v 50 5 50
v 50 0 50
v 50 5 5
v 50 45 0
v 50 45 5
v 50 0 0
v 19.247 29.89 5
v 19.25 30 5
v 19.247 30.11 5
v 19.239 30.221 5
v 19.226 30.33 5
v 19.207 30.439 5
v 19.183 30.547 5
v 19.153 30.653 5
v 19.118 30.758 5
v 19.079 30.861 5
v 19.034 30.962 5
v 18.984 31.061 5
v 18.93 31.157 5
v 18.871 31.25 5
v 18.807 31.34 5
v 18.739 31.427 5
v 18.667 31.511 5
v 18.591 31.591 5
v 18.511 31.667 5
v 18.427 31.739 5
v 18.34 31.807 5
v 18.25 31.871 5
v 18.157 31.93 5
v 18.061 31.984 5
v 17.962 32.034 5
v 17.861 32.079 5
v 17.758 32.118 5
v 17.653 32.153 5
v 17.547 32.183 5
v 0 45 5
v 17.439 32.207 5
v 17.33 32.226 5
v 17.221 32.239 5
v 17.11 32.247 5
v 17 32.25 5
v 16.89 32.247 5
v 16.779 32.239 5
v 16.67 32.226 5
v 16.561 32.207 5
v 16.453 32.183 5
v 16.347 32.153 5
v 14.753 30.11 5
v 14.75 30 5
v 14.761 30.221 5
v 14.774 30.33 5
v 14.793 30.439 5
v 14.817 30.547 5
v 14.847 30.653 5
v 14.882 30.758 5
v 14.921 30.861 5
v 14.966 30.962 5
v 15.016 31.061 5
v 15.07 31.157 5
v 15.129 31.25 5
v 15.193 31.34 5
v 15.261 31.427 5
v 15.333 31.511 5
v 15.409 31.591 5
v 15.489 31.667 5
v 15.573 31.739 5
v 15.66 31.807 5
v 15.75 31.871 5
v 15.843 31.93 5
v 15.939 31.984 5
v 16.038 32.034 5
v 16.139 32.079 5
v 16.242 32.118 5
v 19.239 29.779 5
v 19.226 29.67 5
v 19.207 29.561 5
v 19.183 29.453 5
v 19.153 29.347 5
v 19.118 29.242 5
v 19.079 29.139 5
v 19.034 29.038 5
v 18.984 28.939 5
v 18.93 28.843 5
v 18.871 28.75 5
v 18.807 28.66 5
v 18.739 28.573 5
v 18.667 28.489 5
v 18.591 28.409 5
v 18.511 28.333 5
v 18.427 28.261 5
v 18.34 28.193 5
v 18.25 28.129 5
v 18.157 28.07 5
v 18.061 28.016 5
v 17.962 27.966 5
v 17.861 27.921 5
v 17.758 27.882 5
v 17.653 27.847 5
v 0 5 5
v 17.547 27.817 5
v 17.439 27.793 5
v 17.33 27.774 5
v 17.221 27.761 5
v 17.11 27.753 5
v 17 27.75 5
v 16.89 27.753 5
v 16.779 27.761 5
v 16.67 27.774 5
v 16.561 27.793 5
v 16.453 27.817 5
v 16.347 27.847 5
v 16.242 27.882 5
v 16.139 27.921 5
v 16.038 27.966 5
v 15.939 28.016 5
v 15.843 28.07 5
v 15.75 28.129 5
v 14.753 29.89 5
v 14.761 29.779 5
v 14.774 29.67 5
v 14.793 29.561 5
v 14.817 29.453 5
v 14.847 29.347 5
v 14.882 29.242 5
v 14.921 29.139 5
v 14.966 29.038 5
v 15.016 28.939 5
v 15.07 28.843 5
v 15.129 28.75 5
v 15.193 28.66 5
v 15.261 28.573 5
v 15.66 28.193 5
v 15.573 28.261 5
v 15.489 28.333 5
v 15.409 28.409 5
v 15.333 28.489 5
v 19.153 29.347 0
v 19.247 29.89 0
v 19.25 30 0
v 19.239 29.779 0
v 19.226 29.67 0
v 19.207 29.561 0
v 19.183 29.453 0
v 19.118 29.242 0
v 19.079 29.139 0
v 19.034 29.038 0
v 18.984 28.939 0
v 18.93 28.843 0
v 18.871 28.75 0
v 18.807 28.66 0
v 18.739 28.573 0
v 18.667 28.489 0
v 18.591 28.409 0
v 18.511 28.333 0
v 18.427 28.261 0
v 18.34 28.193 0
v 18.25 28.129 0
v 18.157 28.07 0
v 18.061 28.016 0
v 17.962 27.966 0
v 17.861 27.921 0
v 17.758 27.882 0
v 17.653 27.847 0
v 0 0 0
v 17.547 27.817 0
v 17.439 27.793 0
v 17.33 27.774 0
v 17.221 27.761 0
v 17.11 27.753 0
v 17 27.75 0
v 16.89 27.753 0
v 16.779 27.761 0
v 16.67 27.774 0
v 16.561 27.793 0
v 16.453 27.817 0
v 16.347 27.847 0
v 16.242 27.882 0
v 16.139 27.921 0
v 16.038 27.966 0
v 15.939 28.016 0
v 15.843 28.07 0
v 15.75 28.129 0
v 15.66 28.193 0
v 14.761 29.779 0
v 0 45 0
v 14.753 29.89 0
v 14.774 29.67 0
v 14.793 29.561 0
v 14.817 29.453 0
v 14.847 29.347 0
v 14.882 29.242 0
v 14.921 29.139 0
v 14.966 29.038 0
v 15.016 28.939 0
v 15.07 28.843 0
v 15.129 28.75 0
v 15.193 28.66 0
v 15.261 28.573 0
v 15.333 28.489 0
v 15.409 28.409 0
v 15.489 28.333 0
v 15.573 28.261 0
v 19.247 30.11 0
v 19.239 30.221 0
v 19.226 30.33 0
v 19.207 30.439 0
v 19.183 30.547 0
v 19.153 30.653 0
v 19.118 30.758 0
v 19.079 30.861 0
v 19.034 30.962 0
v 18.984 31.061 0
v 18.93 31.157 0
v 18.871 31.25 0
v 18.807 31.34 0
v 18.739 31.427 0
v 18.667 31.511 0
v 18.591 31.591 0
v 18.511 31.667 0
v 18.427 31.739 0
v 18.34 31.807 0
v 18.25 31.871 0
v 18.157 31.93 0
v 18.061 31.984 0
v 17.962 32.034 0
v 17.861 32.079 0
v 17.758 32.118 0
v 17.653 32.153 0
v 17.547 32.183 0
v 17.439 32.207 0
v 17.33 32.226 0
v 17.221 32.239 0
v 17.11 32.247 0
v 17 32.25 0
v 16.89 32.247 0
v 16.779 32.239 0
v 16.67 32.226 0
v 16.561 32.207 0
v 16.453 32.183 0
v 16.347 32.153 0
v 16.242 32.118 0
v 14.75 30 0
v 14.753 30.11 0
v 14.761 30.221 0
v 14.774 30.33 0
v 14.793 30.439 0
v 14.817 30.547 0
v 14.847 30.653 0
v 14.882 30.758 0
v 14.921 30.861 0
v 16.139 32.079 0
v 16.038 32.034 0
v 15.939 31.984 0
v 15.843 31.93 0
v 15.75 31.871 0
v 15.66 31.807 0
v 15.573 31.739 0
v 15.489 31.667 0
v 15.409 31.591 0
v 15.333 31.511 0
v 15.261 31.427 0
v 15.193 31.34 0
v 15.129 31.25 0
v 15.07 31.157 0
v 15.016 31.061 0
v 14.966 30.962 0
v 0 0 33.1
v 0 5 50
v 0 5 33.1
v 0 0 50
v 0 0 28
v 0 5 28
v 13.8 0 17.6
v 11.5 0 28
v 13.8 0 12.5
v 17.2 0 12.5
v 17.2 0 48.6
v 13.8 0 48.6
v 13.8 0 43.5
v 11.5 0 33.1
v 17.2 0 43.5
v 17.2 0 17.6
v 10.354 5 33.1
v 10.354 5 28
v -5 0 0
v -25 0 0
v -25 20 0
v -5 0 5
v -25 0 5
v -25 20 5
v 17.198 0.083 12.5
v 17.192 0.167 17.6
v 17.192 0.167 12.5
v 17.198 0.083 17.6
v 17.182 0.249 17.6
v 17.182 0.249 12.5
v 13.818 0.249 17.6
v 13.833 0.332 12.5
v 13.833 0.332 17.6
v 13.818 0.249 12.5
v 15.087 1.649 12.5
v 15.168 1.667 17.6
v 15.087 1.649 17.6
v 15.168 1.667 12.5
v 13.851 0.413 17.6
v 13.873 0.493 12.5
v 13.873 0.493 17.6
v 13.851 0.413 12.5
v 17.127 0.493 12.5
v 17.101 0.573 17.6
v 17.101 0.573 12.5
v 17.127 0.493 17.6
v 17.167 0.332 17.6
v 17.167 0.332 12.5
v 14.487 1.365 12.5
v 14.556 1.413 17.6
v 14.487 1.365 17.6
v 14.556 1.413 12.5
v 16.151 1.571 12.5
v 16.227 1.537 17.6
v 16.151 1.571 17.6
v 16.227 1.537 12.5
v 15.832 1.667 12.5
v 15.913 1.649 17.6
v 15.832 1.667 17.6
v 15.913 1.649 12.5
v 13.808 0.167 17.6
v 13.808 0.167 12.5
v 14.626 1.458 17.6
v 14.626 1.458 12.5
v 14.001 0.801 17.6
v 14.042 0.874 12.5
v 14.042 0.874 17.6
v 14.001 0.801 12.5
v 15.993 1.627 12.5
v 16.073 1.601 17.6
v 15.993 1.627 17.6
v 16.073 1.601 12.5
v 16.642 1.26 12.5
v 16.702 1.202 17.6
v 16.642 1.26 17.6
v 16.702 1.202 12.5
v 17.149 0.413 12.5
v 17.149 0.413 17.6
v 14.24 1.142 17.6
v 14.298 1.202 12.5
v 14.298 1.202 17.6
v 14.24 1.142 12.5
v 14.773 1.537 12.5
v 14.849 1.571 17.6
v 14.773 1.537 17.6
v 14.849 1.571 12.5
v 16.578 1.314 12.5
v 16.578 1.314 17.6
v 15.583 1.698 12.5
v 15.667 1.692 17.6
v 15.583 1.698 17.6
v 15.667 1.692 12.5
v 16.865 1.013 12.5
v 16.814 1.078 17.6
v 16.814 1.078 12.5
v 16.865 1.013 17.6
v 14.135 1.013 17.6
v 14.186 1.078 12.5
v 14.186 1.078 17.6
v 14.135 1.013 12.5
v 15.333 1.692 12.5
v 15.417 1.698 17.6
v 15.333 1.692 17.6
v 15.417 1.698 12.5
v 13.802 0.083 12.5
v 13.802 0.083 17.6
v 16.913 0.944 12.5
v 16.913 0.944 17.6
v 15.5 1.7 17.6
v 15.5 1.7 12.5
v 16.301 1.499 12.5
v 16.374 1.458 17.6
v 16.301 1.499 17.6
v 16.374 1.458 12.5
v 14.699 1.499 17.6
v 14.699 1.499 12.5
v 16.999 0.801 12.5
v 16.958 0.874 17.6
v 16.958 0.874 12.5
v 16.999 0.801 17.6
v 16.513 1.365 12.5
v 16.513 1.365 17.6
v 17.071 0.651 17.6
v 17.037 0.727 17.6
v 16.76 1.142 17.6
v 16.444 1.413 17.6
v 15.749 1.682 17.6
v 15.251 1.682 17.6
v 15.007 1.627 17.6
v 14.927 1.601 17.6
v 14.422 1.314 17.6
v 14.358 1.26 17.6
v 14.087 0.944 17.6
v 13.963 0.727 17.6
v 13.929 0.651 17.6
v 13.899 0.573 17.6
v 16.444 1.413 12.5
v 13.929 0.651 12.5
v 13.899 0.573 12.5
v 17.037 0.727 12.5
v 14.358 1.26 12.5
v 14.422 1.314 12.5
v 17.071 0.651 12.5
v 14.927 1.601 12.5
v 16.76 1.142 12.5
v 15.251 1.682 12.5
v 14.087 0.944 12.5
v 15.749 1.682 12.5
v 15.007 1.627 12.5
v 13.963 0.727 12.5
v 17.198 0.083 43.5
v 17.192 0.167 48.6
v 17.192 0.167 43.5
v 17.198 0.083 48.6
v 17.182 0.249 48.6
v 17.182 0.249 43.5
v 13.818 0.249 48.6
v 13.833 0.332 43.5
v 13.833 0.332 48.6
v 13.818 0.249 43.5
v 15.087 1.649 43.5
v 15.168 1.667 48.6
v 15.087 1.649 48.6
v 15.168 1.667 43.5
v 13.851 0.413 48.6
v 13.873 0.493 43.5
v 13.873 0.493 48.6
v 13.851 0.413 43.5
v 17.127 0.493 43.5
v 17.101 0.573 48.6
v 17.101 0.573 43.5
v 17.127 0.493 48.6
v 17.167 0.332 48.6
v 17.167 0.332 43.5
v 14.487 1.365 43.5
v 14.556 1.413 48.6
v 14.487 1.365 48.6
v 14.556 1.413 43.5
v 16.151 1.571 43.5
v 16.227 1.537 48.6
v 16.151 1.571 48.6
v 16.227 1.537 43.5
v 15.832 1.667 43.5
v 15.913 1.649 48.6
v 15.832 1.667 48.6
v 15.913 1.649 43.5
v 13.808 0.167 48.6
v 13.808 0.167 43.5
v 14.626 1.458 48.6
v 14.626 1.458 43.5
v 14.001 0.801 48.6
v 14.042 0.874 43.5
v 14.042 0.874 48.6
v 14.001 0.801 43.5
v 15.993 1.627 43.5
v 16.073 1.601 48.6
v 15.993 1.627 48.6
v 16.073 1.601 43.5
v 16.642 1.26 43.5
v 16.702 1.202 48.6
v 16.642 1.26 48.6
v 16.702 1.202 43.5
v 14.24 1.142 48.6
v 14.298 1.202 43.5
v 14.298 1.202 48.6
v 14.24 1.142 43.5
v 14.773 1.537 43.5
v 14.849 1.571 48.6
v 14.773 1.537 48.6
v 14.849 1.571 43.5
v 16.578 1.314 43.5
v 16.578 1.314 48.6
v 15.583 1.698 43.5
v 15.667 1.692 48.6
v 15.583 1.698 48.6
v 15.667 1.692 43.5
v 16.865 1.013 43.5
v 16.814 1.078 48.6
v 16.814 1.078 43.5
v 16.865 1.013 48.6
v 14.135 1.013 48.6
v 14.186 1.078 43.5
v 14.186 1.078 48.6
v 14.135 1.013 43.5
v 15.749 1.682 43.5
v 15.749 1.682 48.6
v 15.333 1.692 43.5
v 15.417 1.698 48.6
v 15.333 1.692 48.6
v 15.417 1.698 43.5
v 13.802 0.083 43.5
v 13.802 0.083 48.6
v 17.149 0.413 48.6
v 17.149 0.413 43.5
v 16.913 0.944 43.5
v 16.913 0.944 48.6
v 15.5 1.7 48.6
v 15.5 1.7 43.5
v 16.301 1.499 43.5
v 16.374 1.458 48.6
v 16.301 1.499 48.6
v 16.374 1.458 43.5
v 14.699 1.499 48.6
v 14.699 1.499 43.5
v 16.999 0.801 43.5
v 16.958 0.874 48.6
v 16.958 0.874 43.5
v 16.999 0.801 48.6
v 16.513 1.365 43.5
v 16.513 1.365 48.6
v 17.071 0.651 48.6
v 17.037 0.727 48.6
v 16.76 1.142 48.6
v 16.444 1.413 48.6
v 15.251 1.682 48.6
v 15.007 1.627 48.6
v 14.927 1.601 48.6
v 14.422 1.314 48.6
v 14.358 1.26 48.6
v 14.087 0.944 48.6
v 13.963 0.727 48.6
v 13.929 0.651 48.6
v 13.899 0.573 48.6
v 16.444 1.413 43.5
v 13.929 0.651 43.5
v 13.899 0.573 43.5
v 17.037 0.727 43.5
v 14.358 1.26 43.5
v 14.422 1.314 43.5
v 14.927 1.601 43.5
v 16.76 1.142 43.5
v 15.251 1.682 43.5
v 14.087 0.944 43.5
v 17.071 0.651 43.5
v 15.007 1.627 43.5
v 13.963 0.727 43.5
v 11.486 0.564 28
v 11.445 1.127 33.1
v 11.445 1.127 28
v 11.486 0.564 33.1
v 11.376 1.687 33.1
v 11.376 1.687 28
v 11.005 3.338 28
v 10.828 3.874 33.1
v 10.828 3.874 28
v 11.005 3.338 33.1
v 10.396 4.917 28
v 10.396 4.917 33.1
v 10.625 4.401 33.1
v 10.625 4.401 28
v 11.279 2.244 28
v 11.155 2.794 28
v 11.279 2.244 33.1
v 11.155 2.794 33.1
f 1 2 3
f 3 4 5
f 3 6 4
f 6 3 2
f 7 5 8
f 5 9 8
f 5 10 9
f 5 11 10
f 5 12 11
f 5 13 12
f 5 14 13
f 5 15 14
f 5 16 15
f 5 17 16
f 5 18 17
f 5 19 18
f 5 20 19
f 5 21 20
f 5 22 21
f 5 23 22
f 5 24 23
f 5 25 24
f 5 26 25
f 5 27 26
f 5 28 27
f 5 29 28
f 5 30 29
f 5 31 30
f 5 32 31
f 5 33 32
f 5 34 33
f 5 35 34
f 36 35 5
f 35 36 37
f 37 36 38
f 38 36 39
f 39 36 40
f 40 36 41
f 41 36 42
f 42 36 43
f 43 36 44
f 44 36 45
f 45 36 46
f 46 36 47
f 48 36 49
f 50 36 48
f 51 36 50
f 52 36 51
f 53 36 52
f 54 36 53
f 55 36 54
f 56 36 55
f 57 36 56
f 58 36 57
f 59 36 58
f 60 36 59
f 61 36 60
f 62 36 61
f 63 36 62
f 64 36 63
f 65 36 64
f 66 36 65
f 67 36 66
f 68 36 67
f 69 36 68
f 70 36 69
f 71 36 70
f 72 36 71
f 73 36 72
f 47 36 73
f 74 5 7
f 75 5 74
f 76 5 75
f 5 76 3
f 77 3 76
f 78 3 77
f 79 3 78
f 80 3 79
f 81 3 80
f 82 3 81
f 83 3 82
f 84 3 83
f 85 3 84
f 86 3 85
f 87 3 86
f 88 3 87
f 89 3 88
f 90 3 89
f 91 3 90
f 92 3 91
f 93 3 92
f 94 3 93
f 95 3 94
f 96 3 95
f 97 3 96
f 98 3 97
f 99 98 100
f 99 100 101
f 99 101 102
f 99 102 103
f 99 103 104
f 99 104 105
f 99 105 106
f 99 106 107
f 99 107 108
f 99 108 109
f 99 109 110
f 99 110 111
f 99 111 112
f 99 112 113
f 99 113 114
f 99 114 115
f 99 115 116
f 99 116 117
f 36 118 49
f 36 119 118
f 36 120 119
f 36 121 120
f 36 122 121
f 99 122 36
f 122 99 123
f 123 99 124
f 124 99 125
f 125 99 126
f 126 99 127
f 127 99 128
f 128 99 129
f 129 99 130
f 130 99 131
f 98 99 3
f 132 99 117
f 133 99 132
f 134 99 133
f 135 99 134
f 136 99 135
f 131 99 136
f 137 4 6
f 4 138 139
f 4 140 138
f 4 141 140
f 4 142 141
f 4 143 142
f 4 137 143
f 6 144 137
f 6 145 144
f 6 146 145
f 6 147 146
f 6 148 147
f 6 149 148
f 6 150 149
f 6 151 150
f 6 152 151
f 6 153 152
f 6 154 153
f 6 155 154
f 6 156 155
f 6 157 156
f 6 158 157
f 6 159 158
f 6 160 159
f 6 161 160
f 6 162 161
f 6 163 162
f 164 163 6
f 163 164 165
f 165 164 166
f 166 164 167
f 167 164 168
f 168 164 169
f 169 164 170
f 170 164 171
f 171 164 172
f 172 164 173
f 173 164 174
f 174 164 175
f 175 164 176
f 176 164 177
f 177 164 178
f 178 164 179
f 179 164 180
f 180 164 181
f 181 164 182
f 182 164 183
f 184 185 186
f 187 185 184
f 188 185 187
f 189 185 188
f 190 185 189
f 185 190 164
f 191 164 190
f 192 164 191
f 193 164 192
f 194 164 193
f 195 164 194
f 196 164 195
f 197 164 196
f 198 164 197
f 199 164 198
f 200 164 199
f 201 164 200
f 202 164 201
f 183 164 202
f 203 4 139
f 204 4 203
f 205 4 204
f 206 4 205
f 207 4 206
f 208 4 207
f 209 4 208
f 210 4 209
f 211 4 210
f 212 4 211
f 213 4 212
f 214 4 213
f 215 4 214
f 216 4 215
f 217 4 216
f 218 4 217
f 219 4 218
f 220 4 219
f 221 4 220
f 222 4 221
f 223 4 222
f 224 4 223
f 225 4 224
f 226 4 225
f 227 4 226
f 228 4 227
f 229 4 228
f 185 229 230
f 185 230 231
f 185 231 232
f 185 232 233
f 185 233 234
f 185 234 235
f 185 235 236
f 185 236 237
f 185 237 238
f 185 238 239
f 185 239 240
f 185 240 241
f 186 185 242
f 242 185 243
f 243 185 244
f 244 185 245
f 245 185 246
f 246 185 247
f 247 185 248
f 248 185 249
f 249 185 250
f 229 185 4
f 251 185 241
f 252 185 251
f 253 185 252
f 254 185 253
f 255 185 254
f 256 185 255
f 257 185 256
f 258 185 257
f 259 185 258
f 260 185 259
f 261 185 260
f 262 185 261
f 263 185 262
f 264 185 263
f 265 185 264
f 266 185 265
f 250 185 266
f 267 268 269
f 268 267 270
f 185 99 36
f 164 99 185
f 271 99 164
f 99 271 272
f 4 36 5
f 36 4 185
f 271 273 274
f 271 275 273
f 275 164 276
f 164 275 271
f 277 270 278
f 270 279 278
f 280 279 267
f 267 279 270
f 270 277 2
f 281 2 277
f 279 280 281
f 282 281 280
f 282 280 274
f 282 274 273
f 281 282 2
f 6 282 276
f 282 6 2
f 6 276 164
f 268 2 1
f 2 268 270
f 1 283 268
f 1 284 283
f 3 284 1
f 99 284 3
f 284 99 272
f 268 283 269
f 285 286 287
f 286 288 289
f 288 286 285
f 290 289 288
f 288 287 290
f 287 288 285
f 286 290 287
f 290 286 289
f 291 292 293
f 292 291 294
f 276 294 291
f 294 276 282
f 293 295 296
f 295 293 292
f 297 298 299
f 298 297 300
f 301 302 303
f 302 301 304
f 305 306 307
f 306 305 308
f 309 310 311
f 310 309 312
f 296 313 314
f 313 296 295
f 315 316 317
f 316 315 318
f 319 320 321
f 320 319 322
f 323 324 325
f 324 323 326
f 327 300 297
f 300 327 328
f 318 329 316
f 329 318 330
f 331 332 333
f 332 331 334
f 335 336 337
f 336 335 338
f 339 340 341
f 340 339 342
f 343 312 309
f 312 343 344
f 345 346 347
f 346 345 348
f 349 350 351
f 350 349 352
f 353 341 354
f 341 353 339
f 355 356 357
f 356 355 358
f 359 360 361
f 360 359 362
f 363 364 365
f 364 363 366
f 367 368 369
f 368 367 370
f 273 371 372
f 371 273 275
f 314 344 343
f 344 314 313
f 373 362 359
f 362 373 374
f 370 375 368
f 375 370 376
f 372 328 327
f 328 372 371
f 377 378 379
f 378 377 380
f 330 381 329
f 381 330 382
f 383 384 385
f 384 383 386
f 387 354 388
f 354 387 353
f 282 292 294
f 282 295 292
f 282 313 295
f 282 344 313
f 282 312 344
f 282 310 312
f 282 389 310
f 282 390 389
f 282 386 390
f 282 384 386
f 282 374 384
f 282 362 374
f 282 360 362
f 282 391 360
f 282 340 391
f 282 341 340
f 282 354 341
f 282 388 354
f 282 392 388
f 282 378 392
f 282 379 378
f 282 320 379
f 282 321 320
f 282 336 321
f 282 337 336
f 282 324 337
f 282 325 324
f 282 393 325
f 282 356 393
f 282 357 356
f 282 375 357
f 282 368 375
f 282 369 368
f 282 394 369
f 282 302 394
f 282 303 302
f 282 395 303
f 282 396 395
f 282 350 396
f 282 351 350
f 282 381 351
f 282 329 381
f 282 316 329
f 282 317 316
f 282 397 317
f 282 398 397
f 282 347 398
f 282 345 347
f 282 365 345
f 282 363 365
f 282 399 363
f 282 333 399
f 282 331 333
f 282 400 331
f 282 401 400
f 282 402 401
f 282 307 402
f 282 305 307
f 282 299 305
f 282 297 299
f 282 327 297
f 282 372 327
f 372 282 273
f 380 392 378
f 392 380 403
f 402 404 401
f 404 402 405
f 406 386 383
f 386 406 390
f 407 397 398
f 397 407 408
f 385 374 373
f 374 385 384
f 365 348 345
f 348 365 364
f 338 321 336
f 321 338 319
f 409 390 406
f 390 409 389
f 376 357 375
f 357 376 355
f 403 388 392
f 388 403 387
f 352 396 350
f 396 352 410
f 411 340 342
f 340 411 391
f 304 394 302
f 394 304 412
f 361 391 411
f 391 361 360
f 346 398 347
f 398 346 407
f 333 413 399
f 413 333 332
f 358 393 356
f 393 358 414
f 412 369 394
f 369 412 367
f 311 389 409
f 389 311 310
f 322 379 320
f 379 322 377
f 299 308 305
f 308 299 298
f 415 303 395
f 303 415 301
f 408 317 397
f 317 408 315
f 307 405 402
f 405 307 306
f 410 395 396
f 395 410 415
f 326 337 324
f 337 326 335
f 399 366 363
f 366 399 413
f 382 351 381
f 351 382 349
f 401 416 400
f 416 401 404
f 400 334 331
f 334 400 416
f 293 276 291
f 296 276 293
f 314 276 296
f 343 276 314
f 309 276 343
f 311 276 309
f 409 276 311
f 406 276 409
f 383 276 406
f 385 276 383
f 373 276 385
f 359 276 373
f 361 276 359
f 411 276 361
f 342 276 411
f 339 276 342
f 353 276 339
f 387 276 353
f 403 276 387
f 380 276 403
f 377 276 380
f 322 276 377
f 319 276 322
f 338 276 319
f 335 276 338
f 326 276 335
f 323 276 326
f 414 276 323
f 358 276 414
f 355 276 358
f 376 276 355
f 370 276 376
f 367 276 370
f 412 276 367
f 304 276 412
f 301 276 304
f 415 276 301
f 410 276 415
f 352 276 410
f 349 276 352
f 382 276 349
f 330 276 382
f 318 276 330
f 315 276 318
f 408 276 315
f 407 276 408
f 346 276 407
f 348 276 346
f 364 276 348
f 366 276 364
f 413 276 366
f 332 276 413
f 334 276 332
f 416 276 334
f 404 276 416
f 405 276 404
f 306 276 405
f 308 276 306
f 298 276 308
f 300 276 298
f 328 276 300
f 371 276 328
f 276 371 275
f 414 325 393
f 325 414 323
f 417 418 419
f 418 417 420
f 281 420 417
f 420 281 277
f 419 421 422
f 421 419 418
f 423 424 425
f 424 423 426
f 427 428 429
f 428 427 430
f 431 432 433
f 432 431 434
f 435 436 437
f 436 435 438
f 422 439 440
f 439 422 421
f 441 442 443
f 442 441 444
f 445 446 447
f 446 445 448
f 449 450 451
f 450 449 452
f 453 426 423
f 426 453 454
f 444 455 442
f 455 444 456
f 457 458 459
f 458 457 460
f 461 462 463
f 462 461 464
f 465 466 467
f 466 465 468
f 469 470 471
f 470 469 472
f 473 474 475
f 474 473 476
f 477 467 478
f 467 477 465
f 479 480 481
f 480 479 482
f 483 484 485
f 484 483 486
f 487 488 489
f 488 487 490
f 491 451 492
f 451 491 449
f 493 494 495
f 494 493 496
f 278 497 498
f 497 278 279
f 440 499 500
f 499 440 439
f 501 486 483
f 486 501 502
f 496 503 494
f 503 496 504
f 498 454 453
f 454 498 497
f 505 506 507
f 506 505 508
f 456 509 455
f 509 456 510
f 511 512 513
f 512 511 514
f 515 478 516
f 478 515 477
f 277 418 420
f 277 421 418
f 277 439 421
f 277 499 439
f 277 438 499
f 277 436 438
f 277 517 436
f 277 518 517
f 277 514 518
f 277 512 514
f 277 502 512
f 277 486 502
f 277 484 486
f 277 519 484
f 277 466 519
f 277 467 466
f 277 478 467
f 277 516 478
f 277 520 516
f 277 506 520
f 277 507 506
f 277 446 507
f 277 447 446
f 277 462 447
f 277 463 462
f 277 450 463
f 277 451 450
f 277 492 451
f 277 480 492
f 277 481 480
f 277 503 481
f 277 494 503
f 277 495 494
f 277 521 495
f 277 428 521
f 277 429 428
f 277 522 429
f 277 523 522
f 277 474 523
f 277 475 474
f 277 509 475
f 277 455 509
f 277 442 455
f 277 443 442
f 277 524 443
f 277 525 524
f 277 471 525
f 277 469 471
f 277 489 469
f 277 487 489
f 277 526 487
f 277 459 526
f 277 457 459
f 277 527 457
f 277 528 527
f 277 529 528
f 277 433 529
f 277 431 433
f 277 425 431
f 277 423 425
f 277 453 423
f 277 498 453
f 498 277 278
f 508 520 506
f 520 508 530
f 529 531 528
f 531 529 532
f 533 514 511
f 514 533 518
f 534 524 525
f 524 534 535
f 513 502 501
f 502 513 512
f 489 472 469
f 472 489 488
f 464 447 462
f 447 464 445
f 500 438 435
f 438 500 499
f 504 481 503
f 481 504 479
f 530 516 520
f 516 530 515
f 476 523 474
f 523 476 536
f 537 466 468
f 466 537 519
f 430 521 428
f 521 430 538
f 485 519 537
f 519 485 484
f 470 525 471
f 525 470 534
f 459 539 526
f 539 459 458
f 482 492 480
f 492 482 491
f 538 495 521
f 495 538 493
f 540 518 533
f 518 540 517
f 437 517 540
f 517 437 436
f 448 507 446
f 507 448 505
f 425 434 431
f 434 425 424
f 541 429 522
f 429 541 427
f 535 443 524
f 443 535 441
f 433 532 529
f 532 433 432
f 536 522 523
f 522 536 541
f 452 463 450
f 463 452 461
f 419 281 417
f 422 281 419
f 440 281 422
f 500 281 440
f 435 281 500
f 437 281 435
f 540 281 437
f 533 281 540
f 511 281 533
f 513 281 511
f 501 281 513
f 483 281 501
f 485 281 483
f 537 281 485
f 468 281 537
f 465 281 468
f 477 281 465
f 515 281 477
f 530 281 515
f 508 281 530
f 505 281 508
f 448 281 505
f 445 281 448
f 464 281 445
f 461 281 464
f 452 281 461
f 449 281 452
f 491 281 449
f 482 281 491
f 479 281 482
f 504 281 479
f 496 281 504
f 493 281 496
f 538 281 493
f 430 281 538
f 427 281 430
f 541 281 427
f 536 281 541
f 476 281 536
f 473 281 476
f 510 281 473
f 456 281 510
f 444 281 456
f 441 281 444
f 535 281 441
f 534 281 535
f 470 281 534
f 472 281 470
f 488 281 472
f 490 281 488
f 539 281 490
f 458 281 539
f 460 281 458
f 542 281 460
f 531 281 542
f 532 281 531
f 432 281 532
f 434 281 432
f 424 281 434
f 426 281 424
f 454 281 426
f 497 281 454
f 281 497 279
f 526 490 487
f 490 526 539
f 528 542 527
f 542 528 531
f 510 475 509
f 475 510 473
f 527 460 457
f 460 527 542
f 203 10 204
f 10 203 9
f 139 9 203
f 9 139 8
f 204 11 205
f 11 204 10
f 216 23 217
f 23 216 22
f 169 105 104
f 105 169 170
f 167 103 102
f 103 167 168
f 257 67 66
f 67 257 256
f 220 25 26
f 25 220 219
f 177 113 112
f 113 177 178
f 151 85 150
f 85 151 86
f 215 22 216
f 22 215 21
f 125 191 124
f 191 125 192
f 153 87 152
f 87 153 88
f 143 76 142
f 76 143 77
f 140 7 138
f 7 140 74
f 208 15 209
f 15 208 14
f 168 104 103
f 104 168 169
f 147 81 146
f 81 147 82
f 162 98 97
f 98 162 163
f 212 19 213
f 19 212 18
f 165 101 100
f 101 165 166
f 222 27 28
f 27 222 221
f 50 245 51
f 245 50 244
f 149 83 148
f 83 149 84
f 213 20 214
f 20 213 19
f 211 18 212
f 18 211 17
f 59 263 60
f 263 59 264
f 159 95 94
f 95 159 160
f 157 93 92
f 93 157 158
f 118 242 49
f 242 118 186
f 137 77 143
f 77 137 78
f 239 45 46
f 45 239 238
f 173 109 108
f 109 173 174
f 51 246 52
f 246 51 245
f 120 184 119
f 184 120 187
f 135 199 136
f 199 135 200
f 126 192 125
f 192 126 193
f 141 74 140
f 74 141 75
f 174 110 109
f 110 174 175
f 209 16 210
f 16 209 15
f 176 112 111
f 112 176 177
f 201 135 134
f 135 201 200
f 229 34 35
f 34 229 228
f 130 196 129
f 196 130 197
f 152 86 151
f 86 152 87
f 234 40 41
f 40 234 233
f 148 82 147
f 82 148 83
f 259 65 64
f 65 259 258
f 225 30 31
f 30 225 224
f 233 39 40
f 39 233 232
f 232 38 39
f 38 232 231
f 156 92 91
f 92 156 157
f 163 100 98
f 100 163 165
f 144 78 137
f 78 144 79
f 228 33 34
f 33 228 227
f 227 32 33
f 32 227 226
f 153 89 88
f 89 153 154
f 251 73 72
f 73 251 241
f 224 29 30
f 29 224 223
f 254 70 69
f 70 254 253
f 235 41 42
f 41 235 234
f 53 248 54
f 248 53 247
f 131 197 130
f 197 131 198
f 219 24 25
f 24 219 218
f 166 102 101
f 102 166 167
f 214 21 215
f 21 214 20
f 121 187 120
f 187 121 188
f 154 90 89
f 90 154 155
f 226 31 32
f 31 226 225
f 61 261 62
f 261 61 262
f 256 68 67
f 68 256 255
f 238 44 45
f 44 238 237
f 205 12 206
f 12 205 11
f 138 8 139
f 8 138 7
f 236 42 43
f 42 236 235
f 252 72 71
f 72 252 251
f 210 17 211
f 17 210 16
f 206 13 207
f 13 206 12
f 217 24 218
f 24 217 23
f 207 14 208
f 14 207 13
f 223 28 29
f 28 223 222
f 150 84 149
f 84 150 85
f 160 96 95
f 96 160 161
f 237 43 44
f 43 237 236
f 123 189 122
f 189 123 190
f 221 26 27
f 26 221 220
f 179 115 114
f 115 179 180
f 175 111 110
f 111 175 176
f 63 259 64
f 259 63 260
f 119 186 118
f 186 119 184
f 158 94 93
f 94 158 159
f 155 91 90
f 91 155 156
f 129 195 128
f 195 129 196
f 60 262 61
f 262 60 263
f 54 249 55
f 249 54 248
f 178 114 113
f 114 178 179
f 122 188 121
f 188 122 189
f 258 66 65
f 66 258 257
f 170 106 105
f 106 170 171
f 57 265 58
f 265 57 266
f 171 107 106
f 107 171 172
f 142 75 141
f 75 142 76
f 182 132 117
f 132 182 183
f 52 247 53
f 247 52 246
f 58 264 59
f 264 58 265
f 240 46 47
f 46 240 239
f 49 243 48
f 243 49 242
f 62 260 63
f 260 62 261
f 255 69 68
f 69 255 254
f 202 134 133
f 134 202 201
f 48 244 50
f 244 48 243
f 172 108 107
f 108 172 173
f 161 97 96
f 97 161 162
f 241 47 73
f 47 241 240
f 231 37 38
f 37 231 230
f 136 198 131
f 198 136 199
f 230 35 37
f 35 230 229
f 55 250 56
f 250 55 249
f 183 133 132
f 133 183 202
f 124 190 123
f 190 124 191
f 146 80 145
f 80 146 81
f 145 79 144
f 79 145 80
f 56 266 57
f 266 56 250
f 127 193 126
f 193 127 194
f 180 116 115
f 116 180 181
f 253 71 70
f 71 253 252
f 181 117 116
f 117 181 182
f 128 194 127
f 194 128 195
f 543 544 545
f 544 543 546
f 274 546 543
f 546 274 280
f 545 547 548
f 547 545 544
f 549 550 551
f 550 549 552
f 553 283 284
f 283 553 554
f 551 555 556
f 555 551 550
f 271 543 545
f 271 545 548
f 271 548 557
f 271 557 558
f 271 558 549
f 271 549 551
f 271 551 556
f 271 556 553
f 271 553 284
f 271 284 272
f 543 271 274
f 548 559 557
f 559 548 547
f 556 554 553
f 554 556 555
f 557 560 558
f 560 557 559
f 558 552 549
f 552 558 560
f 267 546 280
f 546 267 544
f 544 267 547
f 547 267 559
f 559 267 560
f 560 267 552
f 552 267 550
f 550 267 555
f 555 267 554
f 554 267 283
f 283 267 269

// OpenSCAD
$fn = 128;

// --- Base Plate Dimensions ---
// X range: -25 to 25 (Width = 50)
// Y range: 0 to 45 (Depth = 45)
// Z range: 0 to 5 (Thickness = 5)
BASE_X_MIN = -25;
BASE_X_MAX = 25;
BASE_Y_MIN = 0;
BASE_Y_MAX = 45;
BASE_Z_MAX = 5;

// --- Base Plate Holes (M4) ---
// Position: x = -17, y = 30 and x = 17, y = 30
// Diameter: 4.5 mm
BASE_HOLE_X_1 = -17;
BASE_HOLE_Y_1 = 30;
BASE_HOLE_X_2 = 17;
BASE_HOLE_Y_2 = 30;
BASE_HOLE_DIAMETER = 4.5;

// --- Vertical Motor Plate Dimensions ---
// X range: -25 to 25 (Width = 50)
// Y range: 0 to 5 (Depth = 5)
// Z range: 0 to 50 (Height = 50)
// Stands on the back edge of the base (y=0 to y=5)
MOTOR_X_MIN = -25;
MOTOR_X_MAX = 25;
MOTOR_Y_MAX = 5;
MOTOR_Z_MAX = 50;

// --- Motor Plate Boss Hole ---
// Diameter: 23 mm
// Centre: x = 0, z = 28
// Cut along Y axis (through the plate)
BOSS_HOLE_DIAMETER = 23;
BOSS_HOLE_X = 0;
BOSS_HOLE_Z = 28;

// --- Motor Plate Screw Holes (M3) ---
// Diameter: 3.4 mm
// Pattern: 31 mm square, centred on boss hole (x=0, z=28)
// 4 holes total
SCREW_HOLE_DIAMETER = 3.4;
SCREW_PATTERN_SIZE = 31;

// --- Gusset Dimensions ---
// Thickness: 5 mm (same as base)
// Location: Left (x=-25 to -20) and Right (x=20 to 25)
// Shape: Right triangle in YZ plane
// Legs: 20 mm along +Y, 20 mm along +Z
// Right-angle corner at y=5, z=5
GUSSET_THICKNESS = 5;
GUSSET_Y_LEG = 20;
GUSSET_Z_LEG = 20;
GUSSET_CORNER_Y = 5;
GUSSET_CORNER_Z = 5;
GUSSET_LEFT_X_MIN = -25;
GUSSET_LEFT_X_MAX = -20;
GUSSET_RIGHT_X_MIN = 20;
GUSSET_RIGHT_X_MAX = 25;

// --- Construction ---

difference() {
    union() {
        // 1. Base Plate
        translate([0, 0, 0]) {
            cube([
                BASE_X_MAX - BASE_X_MIN,
                BASE_Y_MAX - BASE_Y_MIN,
                BASE_Z_MAX
            ]);
        }

        // 2. Vertical Motor Plate
        translate([0, 0, 0]) {
            cube([
                MOTOR_X_MAX - MOTOR_X_MIN,
                MOTOR_Y_MAX,
                MOTOR_Z_MAX
            ]);
        }

        // 3. Left Gusset
        // Right triangle in YZ plane, extruded along X
        // Vertices relative to corner (5,5): (0,0), (20,0), (0,20)
        // Extruded from x = -25 to -20
        translate([GUSSET_LEFT_X_MIN, 0, 0]) {
            linear_extrude(height = GUSSET_THICKNESS) {
                polygon([
                    [0, 0],
                    [GUSSET_Y_LEG, 0],
                    [0, GUSSET_Z_LEG]
                ]);
            }
        }

        // 4. Right Gusset
        // Extruded from x = 20 to 25
        translate([GUSSET_RIGHT_X_MIN, 0, 0]) {
            linear_extrude(height = GUSSET_THICKNESS) {
                polygon([
                    [0, 0],
                    [GUSSET_Y_LEG, 0],
                    [0, GUSSET_Z_LEG]
                ]);
            }
        }
    }

    // Cut Holes (Base Plate)
    // Hole 1 at x = -17
    translate([BASE_HOLE_X_1, BASE_HOLE_Y_1, 0]) {
        cylinder(h = BASE_Z_MAX + 0.1, d = BASE_HOLE_DIAMETER);
    }
    // Hole 2 at x = 17
    translate([BASE_HOLE_X_2, BASE_HOLE_Y_2, 0]) {
        cylinder(h = BASE_Z_MAX + 0.1, d = BASE_HOLE_DIAMETER);
    }

    // Cut Boss Hole (Motor Plate)
    // Centre at x=0, z=28. Extends through the plate (y=0 to y=5).
    translate([BOSS_HOLE_X, 0, BOSS_HOLE_Z]) {
        cylinder(h = MOTOR_Y_MAX + 0.1, d = BOSS_HOLE_DIAMETER);
    }

    // Cut Screw Holes (Motor Plate)
    // 4 holes on 31mm square pattern centred at (0, 28)
    // Square side = 31, so half-side = 15.5
    // Coordinates: x = +/- 15.5, z = 28 +/- 15.5
    for (i = [-1, 1]) {
        for (j = [-1, 1]) {
            translate([
                i * (SCREW_PATTERN_SIZE / 2),
                0,
                BOSS_HOLE_Z + j * (SCREW_PATTERN_SIZE / 2)
            ]) {
                cylinder(h = MOTOR_Y_MAX + 0.1, d = SCREW_HOLE_DIAMETER);
            }
        }
    }
}
